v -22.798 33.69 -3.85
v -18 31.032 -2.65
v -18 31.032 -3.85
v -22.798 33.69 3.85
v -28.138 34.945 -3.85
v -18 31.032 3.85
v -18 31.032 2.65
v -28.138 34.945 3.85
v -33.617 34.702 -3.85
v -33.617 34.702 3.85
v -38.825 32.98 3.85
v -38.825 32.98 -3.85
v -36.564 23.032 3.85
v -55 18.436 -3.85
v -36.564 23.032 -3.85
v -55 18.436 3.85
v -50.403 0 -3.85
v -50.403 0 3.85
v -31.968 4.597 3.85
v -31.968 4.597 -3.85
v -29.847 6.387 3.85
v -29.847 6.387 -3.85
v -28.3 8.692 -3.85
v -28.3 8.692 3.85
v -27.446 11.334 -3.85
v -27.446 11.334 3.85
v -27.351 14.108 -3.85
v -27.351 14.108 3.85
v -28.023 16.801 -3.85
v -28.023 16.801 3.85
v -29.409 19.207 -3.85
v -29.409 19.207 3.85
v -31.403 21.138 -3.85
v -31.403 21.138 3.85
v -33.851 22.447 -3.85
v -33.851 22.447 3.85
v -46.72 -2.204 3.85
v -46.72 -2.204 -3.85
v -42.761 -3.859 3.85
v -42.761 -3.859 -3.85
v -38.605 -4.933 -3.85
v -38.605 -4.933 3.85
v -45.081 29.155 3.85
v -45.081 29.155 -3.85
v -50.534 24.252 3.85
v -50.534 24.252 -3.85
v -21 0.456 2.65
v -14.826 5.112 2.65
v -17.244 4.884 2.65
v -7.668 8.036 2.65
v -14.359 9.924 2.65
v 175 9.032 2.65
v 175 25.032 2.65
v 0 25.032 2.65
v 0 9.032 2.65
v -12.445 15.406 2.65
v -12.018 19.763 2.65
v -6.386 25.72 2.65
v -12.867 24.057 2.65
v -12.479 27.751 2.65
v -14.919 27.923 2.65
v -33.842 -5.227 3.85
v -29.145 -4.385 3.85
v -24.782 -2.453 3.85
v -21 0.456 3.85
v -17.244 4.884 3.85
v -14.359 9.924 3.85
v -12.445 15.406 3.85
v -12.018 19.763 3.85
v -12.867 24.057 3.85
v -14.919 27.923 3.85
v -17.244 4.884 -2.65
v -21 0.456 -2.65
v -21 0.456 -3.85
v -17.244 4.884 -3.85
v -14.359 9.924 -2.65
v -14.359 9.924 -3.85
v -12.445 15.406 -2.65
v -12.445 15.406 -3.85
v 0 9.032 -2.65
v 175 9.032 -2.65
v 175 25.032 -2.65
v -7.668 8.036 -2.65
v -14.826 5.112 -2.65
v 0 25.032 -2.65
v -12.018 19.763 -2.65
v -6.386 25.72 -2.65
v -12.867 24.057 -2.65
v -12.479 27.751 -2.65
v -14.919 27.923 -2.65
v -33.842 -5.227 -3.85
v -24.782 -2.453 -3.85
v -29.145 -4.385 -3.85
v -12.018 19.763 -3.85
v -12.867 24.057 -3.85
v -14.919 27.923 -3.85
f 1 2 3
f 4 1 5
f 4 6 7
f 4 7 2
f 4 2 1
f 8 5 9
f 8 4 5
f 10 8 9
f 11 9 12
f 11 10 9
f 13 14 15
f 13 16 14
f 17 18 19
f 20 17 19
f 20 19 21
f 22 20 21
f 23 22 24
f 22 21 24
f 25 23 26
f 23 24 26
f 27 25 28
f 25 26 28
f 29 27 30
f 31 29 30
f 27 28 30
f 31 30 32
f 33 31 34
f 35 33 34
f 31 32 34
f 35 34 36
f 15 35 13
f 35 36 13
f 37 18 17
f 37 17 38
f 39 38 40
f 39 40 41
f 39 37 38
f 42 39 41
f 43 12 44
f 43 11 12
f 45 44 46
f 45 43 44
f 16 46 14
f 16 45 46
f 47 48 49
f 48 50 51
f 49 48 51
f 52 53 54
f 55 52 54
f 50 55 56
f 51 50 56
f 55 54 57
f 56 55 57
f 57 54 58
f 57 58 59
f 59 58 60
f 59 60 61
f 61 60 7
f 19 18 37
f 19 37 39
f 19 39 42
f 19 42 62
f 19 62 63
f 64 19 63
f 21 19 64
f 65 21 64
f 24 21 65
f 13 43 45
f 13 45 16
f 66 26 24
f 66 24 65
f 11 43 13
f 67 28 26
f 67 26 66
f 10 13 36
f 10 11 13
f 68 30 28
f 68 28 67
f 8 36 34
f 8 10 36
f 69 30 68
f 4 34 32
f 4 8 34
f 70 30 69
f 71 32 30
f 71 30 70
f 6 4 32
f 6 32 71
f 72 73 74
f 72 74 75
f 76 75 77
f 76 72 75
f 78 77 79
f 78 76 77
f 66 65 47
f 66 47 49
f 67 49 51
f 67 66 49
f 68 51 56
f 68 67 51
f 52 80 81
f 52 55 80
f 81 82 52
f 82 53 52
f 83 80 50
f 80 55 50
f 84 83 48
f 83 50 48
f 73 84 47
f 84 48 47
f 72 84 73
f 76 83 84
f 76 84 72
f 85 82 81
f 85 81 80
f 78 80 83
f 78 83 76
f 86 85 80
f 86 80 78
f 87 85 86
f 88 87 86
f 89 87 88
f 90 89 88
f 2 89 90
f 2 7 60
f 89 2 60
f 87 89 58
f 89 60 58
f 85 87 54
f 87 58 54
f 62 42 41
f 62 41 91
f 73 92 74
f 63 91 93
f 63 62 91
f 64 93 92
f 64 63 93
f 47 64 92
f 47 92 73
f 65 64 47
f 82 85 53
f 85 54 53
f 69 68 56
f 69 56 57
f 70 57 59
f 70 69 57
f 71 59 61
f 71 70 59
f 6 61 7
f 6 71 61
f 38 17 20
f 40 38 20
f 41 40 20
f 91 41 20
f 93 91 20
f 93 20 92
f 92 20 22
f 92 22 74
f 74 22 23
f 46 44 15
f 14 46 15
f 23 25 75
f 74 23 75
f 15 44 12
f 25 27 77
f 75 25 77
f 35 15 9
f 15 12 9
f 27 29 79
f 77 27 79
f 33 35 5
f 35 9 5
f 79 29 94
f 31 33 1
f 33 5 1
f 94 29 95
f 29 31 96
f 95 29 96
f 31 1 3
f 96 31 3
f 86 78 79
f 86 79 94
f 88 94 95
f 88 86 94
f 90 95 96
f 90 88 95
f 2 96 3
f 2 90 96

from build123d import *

# Parameters (mm, degrees)
PAD_DEPTH    = 2.65
PAD001_DEPTH = 3.85


with BuildPart() as part:
    # Sketch001 → Pad (new body, symmetric)
    with BuildSketch(Plane.XY):
        with BuildLine():
            ThreePointArc((-18, 31.032135), (-9.486833, 26.571636), (0, 25.032135))
            Line((0, 25.032135), (140, 25.032135))
            Line((140, 25.032135), (175, 25.032135))
            Line((175, 25.032135), (175, 9.032135))
            Line((140, 9.032135), (175, 9.032135))
            Line((0, 9.032135), (140, 9.032135))
            ThreePointArc((0, 9.032135), (-11.341769, 6.80558), (-21, 0.45642))
            ThreePointArc((-21, 0.45642), (-15.685703, 7.338058), (-12.444835, 15.406233))
            ThreePointArc((-12.444835, 15.406233), (-12.866577, 24.056709), (-18, 31.032135))
        make_face()
    extrude(amount=PAD_DEPTH, both=True)

    # Sketch → Pad001 (join, symmetric)
    with BuildSketch(Plane.XY):
        with BuildLine():
            Line((-55, 18.435619), (-36.564381, 23.032135))
            ThreePointArc((-31.967865, 4.596516), (-27.592913, 15.478143), (-36.564381, 23.032135))
            Line((-50.403484, 0), (-31.967865, 4.596516))
            ThreePointArc((-50.403484, 0), (-44.770144, -3.102558), (-38.604972, -4.933145))
            ThreePointArc((-38.604972, -4.933145), (-29.145429, -4.384635), (-21, 0.45642))
            ThreePointArc((-21, 0.45642), (-15.685703, 7.338058), (-12.444835, 15.406233))
            ThreePointArc((-12.444835, 15.406233), (-12.866577, 24.056709), (-18, 31.032135))
            ThreePointArc((-18, 31.032135), (-28.137567, 34.94523), (-38.824935, 32.979851))
            ThreePointArc((-38.824935, 32.979851), (-47.920113, 26.828366), (-55, 18.435619))
        make_face()
    extrude(amount=PAD001_DEPTH, both=True)


solid = part.part
